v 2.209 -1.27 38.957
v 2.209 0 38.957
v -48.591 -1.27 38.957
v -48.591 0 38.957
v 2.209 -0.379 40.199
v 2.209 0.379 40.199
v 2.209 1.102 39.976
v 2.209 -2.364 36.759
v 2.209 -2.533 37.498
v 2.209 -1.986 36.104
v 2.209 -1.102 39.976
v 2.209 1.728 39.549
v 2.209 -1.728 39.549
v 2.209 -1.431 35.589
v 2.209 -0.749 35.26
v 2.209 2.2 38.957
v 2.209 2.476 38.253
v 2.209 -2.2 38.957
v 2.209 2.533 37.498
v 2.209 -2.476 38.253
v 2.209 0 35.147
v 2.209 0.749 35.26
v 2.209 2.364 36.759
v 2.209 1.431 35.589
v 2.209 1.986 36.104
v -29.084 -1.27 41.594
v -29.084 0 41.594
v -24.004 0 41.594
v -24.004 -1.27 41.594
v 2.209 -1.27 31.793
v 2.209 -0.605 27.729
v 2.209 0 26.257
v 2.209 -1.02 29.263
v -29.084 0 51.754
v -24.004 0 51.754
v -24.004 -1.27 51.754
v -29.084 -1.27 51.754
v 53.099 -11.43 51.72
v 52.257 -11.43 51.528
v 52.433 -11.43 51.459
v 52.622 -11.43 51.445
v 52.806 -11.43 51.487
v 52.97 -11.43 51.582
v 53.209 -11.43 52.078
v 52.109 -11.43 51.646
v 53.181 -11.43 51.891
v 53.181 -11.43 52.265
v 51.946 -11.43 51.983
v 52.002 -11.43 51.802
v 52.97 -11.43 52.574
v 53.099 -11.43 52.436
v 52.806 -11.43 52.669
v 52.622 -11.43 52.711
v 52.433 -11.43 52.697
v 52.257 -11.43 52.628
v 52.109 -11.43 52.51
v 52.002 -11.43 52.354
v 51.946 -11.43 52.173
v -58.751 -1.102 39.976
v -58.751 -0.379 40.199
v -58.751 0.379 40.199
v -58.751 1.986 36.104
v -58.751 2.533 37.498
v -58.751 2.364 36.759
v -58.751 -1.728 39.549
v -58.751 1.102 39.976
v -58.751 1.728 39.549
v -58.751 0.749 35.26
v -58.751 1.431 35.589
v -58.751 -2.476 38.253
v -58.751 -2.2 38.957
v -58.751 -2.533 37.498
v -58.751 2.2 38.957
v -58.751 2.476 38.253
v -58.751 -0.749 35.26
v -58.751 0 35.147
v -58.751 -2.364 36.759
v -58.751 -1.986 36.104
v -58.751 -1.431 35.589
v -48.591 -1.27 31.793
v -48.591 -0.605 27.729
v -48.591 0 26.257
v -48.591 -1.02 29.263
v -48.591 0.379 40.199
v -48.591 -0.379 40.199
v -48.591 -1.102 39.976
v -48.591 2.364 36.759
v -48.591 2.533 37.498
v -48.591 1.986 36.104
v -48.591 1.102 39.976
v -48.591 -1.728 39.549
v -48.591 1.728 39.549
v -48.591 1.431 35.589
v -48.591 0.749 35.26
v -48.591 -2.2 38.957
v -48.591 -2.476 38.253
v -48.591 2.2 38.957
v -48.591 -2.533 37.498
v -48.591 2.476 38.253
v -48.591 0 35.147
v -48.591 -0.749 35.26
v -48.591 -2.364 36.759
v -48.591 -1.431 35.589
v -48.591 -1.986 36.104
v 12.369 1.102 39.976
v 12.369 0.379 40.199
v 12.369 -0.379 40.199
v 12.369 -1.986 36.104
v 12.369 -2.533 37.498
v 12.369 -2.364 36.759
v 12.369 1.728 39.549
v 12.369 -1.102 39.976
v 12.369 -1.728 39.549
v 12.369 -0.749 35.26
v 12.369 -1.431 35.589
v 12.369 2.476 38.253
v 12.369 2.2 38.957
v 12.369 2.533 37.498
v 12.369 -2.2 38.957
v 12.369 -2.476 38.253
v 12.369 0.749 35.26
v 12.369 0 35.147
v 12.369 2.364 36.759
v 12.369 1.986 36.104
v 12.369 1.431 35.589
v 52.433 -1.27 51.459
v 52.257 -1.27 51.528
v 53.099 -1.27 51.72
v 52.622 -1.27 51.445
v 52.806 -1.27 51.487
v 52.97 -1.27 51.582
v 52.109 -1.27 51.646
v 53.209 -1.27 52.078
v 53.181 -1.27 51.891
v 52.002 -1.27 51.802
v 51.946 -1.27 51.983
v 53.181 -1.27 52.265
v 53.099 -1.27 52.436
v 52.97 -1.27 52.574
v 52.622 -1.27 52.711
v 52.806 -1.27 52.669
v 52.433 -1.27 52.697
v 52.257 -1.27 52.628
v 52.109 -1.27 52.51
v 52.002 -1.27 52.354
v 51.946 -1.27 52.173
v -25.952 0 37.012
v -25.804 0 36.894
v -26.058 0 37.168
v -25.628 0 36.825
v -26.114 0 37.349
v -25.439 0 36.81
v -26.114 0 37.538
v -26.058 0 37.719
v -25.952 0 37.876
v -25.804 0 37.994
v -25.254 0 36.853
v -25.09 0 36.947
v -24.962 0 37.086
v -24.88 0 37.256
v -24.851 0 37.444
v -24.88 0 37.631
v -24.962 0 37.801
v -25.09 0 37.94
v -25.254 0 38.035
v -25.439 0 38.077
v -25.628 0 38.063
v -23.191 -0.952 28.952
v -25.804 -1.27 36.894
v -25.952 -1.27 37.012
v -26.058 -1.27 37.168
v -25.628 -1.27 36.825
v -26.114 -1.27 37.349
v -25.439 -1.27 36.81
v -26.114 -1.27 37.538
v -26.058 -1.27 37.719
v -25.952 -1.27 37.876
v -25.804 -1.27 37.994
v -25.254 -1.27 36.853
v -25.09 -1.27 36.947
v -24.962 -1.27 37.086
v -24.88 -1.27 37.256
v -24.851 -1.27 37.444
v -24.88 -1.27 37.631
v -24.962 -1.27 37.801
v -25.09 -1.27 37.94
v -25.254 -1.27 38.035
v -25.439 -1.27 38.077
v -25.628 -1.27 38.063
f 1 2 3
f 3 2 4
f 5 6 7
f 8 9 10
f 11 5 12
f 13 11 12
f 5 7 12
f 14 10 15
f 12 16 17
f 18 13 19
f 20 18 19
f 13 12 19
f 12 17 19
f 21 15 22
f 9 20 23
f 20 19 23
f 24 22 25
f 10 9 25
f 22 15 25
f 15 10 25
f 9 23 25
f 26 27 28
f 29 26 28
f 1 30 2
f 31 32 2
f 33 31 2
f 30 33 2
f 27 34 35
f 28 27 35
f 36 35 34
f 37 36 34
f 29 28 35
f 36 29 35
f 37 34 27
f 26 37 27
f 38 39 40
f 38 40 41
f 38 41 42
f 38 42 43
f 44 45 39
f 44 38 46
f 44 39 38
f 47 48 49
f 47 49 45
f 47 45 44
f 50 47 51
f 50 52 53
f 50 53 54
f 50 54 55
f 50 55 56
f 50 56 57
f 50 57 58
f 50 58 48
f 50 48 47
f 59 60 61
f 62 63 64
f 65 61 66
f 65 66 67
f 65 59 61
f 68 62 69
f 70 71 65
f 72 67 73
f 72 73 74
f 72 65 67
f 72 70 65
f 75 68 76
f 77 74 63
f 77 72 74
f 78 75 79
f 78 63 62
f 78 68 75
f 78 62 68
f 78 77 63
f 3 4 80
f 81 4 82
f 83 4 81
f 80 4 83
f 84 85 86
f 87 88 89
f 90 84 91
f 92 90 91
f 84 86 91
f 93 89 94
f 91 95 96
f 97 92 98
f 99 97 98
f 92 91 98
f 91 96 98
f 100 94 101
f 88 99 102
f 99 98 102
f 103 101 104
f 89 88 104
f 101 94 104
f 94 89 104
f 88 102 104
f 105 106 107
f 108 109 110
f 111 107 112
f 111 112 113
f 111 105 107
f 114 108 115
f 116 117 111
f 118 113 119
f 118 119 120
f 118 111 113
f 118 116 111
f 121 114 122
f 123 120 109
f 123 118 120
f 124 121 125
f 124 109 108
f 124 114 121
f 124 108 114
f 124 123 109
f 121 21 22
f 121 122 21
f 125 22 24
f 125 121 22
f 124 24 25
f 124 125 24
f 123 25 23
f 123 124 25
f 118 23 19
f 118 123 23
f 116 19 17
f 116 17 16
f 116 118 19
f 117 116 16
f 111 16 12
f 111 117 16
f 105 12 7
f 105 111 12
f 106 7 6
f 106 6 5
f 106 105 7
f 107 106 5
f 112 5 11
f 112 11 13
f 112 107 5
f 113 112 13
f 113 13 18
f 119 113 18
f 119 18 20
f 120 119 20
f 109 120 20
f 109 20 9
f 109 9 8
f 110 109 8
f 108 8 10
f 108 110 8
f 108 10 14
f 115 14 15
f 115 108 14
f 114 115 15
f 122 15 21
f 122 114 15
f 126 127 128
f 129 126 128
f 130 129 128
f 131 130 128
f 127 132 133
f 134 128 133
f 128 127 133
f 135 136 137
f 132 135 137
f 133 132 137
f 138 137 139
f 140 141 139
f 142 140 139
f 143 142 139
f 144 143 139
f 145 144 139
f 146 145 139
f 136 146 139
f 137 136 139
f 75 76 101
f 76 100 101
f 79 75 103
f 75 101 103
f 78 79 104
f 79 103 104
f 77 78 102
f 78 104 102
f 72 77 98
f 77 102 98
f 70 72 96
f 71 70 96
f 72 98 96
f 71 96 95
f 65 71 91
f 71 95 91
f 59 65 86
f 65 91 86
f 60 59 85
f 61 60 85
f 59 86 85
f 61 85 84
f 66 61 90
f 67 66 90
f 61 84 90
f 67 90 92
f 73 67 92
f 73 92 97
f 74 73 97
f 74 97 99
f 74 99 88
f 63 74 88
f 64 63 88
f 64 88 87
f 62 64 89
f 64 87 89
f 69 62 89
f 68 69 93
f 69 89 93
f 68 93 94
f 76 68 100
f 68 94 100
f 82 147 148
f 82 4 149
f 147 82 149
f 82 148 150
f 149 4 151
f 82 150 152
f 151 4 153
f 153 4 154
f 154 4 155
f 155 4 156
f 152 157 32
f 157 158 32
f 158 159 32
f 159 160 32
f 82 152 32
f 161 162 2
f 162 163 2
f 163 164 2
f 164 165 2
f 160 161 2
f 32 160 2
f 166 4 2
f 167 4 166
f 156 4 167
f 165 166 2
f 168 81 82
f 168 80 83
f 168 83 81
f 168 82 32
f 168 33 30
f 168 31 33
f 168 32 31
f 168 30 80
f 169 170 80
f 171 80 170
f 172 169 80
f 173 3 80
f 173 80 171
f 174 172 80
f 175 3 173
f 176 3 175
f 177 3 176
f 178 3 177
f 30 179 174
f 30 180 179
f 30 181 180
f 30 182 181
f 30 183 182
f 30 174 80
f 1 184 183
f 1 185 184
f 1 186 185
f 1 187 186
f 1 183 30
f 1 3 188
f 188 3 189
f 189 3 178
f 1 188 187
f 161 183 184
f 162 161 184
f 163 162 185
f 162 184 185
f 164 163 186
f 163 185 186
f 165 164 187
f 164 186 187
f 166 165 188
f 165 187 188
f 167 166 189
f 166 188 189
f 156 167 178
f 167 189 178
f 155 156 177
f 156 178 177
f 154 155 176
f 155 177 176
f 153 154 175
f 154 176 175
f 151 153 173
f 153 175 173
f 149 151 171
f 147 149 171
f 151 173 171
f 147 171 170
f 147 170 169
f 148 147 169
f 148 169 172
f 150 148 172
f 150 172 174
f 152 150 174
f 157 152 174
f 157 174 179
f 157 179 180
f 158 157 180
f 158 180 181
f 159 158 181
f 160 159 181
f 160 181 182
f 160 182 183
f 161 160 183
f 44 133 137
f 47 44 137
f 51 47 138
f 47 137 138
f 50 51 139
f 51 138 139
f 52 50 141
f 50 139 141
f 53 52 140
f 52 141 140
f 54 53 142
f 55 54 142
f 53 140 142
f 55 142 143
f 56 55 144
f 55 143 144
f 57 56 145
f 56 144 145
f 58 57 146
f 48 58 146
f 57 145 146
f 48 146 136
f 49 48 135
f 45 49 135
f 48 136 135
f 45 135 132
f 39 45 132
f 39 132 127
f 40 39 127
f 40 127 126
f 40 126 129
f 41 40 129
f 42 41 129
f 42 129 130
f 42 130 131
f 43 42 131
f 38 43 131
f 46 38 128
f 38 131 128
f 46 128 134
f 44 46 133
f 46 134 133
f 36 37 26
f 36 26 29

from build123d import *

# Parameters (mm, degrees)
F0_W        = 10.16
F0_H        = 2.54
F3_DEPTH    = 1.27
F4_T1_DEPTH = 78.4790082915
F5_R        = 0.635
F6_DEPTH    = 3.811
F7_DEPTH    = 10.16
F8_DEPTH    = 1.27


# Not quite as in the source:
# - a fillet or chamfer that OpenCascade refuses, or shapes differently, is made with other operations: its cross-section is extruded or revolved along the edge and cut away or added


with BuildPart() as f1:
    # F0 (on Front) → F1 (revolve)
    with BuildSketch(Plane.XZ):
        with Locations((-53.6708150854, 36.4173984443)):
            Rectangle(F0_W, F0_H)
    revolve(axis=Axis((-53.6708150854, 0, 37.6873984443), (-1, 0, 0)))


with BuildPart() as f2:
    # F0 (on Front) → F2 (revolve)
    with BuildSketch(Plane.XZ):
        with Locations((7.2891849146, 36.4173984443)):
            Rectangle(F0_W, F0_H)
    revolve(axis=Axis((7.2891849146, 0, 37.6873984443), (1, 0, 0)))


with BuildPart() as f3:
    # F0 (on Front) → F3 (new body)
    with BuildSketch(Plane.XZ):
        Polygon((-48.5908150854, 26.2573984443), (2.2091849146, 26.2573984443), (2.2091849146, 35.1473984443), (2.2091849146, 37.6873984443), (2.2091849146, 38.9573984443), (-48.5908150854, 38.9573984443), (-48.5908150854, 37.6873984443), (-48.5908150854, 35.1473984443), align=None)
    extrude(amount=F3_DEPTH)

    # F4: fillet of radius 12.7 on 1 edges, made by hand

    # F4_s2 → F4_t1 (cut)
    with BuildSketch(Plane.YZ.offset(-62.4303192311)):
        with BuildLine():
            add(Edge.make_bspline(
                [(0, 26.2573984443), (-1.27, 28.8796202825), (-1.27, 31.7932001026)],
                knots=[0, 0, 0, 1, 1, 1], degree=2, weights=[1, 1, 1]))
            Line((-1.27, 31.7932001026), (-1.524, 31.7932001026))
            Line((-1.524, 31.7932001026), (-1.524, 26.2573984443))
            Line((-1.524, 26.2573984443), (-1.27, 26.0033984443))
            ThreePointArc((-1.27, 26.0033984443), (-0.635, 26.0033984443), (-0.2286, 26.1466824112))
            Line((-0.2286, 26.1466824112), (0, 26.2573984443))
        make_face()
    extrude(amount=F4_T1_DEPTH, mode=Mode.SUBTRACT)

    # F5 (on face) → F6 (cut, through all)
    with BuildSketch(Plane.XZ.offset(1.27)):
        with Locations((-25.4863388836, 37.4436601996)):
            Circle(F5_R)
    extrude(amount=-F6_DEPTH, mode=Mode.SUBTRACT)


with BuildPart() as f7:
    # F5 (on face) → F7 (new body)
    with BuildSketch(Plane.XZ.offset(1.27)):
        with Locations((52.5741390884, 52.078012377)):
            Circle(F5_R)
    extrude(amount=F7_DEPTH)


with BuildPart() as f8:
    # F0 (on Front) → F8 (new body)
    with BuildSketch(Plane.XZ):
        Polygon((-29.0838461369, 51.7536484933), (-29.0838461369, 45.0394451618), (-29.0838461369, 41.5936484933), (-24.0038461369, 41.5936484933), (-24.0038461369, 51.7536484933), align=None)
    extrude(amount=F8_DEPTH)


solid = Compound([f1.part, f2.part, f3.part, f7.part, f8.part])
